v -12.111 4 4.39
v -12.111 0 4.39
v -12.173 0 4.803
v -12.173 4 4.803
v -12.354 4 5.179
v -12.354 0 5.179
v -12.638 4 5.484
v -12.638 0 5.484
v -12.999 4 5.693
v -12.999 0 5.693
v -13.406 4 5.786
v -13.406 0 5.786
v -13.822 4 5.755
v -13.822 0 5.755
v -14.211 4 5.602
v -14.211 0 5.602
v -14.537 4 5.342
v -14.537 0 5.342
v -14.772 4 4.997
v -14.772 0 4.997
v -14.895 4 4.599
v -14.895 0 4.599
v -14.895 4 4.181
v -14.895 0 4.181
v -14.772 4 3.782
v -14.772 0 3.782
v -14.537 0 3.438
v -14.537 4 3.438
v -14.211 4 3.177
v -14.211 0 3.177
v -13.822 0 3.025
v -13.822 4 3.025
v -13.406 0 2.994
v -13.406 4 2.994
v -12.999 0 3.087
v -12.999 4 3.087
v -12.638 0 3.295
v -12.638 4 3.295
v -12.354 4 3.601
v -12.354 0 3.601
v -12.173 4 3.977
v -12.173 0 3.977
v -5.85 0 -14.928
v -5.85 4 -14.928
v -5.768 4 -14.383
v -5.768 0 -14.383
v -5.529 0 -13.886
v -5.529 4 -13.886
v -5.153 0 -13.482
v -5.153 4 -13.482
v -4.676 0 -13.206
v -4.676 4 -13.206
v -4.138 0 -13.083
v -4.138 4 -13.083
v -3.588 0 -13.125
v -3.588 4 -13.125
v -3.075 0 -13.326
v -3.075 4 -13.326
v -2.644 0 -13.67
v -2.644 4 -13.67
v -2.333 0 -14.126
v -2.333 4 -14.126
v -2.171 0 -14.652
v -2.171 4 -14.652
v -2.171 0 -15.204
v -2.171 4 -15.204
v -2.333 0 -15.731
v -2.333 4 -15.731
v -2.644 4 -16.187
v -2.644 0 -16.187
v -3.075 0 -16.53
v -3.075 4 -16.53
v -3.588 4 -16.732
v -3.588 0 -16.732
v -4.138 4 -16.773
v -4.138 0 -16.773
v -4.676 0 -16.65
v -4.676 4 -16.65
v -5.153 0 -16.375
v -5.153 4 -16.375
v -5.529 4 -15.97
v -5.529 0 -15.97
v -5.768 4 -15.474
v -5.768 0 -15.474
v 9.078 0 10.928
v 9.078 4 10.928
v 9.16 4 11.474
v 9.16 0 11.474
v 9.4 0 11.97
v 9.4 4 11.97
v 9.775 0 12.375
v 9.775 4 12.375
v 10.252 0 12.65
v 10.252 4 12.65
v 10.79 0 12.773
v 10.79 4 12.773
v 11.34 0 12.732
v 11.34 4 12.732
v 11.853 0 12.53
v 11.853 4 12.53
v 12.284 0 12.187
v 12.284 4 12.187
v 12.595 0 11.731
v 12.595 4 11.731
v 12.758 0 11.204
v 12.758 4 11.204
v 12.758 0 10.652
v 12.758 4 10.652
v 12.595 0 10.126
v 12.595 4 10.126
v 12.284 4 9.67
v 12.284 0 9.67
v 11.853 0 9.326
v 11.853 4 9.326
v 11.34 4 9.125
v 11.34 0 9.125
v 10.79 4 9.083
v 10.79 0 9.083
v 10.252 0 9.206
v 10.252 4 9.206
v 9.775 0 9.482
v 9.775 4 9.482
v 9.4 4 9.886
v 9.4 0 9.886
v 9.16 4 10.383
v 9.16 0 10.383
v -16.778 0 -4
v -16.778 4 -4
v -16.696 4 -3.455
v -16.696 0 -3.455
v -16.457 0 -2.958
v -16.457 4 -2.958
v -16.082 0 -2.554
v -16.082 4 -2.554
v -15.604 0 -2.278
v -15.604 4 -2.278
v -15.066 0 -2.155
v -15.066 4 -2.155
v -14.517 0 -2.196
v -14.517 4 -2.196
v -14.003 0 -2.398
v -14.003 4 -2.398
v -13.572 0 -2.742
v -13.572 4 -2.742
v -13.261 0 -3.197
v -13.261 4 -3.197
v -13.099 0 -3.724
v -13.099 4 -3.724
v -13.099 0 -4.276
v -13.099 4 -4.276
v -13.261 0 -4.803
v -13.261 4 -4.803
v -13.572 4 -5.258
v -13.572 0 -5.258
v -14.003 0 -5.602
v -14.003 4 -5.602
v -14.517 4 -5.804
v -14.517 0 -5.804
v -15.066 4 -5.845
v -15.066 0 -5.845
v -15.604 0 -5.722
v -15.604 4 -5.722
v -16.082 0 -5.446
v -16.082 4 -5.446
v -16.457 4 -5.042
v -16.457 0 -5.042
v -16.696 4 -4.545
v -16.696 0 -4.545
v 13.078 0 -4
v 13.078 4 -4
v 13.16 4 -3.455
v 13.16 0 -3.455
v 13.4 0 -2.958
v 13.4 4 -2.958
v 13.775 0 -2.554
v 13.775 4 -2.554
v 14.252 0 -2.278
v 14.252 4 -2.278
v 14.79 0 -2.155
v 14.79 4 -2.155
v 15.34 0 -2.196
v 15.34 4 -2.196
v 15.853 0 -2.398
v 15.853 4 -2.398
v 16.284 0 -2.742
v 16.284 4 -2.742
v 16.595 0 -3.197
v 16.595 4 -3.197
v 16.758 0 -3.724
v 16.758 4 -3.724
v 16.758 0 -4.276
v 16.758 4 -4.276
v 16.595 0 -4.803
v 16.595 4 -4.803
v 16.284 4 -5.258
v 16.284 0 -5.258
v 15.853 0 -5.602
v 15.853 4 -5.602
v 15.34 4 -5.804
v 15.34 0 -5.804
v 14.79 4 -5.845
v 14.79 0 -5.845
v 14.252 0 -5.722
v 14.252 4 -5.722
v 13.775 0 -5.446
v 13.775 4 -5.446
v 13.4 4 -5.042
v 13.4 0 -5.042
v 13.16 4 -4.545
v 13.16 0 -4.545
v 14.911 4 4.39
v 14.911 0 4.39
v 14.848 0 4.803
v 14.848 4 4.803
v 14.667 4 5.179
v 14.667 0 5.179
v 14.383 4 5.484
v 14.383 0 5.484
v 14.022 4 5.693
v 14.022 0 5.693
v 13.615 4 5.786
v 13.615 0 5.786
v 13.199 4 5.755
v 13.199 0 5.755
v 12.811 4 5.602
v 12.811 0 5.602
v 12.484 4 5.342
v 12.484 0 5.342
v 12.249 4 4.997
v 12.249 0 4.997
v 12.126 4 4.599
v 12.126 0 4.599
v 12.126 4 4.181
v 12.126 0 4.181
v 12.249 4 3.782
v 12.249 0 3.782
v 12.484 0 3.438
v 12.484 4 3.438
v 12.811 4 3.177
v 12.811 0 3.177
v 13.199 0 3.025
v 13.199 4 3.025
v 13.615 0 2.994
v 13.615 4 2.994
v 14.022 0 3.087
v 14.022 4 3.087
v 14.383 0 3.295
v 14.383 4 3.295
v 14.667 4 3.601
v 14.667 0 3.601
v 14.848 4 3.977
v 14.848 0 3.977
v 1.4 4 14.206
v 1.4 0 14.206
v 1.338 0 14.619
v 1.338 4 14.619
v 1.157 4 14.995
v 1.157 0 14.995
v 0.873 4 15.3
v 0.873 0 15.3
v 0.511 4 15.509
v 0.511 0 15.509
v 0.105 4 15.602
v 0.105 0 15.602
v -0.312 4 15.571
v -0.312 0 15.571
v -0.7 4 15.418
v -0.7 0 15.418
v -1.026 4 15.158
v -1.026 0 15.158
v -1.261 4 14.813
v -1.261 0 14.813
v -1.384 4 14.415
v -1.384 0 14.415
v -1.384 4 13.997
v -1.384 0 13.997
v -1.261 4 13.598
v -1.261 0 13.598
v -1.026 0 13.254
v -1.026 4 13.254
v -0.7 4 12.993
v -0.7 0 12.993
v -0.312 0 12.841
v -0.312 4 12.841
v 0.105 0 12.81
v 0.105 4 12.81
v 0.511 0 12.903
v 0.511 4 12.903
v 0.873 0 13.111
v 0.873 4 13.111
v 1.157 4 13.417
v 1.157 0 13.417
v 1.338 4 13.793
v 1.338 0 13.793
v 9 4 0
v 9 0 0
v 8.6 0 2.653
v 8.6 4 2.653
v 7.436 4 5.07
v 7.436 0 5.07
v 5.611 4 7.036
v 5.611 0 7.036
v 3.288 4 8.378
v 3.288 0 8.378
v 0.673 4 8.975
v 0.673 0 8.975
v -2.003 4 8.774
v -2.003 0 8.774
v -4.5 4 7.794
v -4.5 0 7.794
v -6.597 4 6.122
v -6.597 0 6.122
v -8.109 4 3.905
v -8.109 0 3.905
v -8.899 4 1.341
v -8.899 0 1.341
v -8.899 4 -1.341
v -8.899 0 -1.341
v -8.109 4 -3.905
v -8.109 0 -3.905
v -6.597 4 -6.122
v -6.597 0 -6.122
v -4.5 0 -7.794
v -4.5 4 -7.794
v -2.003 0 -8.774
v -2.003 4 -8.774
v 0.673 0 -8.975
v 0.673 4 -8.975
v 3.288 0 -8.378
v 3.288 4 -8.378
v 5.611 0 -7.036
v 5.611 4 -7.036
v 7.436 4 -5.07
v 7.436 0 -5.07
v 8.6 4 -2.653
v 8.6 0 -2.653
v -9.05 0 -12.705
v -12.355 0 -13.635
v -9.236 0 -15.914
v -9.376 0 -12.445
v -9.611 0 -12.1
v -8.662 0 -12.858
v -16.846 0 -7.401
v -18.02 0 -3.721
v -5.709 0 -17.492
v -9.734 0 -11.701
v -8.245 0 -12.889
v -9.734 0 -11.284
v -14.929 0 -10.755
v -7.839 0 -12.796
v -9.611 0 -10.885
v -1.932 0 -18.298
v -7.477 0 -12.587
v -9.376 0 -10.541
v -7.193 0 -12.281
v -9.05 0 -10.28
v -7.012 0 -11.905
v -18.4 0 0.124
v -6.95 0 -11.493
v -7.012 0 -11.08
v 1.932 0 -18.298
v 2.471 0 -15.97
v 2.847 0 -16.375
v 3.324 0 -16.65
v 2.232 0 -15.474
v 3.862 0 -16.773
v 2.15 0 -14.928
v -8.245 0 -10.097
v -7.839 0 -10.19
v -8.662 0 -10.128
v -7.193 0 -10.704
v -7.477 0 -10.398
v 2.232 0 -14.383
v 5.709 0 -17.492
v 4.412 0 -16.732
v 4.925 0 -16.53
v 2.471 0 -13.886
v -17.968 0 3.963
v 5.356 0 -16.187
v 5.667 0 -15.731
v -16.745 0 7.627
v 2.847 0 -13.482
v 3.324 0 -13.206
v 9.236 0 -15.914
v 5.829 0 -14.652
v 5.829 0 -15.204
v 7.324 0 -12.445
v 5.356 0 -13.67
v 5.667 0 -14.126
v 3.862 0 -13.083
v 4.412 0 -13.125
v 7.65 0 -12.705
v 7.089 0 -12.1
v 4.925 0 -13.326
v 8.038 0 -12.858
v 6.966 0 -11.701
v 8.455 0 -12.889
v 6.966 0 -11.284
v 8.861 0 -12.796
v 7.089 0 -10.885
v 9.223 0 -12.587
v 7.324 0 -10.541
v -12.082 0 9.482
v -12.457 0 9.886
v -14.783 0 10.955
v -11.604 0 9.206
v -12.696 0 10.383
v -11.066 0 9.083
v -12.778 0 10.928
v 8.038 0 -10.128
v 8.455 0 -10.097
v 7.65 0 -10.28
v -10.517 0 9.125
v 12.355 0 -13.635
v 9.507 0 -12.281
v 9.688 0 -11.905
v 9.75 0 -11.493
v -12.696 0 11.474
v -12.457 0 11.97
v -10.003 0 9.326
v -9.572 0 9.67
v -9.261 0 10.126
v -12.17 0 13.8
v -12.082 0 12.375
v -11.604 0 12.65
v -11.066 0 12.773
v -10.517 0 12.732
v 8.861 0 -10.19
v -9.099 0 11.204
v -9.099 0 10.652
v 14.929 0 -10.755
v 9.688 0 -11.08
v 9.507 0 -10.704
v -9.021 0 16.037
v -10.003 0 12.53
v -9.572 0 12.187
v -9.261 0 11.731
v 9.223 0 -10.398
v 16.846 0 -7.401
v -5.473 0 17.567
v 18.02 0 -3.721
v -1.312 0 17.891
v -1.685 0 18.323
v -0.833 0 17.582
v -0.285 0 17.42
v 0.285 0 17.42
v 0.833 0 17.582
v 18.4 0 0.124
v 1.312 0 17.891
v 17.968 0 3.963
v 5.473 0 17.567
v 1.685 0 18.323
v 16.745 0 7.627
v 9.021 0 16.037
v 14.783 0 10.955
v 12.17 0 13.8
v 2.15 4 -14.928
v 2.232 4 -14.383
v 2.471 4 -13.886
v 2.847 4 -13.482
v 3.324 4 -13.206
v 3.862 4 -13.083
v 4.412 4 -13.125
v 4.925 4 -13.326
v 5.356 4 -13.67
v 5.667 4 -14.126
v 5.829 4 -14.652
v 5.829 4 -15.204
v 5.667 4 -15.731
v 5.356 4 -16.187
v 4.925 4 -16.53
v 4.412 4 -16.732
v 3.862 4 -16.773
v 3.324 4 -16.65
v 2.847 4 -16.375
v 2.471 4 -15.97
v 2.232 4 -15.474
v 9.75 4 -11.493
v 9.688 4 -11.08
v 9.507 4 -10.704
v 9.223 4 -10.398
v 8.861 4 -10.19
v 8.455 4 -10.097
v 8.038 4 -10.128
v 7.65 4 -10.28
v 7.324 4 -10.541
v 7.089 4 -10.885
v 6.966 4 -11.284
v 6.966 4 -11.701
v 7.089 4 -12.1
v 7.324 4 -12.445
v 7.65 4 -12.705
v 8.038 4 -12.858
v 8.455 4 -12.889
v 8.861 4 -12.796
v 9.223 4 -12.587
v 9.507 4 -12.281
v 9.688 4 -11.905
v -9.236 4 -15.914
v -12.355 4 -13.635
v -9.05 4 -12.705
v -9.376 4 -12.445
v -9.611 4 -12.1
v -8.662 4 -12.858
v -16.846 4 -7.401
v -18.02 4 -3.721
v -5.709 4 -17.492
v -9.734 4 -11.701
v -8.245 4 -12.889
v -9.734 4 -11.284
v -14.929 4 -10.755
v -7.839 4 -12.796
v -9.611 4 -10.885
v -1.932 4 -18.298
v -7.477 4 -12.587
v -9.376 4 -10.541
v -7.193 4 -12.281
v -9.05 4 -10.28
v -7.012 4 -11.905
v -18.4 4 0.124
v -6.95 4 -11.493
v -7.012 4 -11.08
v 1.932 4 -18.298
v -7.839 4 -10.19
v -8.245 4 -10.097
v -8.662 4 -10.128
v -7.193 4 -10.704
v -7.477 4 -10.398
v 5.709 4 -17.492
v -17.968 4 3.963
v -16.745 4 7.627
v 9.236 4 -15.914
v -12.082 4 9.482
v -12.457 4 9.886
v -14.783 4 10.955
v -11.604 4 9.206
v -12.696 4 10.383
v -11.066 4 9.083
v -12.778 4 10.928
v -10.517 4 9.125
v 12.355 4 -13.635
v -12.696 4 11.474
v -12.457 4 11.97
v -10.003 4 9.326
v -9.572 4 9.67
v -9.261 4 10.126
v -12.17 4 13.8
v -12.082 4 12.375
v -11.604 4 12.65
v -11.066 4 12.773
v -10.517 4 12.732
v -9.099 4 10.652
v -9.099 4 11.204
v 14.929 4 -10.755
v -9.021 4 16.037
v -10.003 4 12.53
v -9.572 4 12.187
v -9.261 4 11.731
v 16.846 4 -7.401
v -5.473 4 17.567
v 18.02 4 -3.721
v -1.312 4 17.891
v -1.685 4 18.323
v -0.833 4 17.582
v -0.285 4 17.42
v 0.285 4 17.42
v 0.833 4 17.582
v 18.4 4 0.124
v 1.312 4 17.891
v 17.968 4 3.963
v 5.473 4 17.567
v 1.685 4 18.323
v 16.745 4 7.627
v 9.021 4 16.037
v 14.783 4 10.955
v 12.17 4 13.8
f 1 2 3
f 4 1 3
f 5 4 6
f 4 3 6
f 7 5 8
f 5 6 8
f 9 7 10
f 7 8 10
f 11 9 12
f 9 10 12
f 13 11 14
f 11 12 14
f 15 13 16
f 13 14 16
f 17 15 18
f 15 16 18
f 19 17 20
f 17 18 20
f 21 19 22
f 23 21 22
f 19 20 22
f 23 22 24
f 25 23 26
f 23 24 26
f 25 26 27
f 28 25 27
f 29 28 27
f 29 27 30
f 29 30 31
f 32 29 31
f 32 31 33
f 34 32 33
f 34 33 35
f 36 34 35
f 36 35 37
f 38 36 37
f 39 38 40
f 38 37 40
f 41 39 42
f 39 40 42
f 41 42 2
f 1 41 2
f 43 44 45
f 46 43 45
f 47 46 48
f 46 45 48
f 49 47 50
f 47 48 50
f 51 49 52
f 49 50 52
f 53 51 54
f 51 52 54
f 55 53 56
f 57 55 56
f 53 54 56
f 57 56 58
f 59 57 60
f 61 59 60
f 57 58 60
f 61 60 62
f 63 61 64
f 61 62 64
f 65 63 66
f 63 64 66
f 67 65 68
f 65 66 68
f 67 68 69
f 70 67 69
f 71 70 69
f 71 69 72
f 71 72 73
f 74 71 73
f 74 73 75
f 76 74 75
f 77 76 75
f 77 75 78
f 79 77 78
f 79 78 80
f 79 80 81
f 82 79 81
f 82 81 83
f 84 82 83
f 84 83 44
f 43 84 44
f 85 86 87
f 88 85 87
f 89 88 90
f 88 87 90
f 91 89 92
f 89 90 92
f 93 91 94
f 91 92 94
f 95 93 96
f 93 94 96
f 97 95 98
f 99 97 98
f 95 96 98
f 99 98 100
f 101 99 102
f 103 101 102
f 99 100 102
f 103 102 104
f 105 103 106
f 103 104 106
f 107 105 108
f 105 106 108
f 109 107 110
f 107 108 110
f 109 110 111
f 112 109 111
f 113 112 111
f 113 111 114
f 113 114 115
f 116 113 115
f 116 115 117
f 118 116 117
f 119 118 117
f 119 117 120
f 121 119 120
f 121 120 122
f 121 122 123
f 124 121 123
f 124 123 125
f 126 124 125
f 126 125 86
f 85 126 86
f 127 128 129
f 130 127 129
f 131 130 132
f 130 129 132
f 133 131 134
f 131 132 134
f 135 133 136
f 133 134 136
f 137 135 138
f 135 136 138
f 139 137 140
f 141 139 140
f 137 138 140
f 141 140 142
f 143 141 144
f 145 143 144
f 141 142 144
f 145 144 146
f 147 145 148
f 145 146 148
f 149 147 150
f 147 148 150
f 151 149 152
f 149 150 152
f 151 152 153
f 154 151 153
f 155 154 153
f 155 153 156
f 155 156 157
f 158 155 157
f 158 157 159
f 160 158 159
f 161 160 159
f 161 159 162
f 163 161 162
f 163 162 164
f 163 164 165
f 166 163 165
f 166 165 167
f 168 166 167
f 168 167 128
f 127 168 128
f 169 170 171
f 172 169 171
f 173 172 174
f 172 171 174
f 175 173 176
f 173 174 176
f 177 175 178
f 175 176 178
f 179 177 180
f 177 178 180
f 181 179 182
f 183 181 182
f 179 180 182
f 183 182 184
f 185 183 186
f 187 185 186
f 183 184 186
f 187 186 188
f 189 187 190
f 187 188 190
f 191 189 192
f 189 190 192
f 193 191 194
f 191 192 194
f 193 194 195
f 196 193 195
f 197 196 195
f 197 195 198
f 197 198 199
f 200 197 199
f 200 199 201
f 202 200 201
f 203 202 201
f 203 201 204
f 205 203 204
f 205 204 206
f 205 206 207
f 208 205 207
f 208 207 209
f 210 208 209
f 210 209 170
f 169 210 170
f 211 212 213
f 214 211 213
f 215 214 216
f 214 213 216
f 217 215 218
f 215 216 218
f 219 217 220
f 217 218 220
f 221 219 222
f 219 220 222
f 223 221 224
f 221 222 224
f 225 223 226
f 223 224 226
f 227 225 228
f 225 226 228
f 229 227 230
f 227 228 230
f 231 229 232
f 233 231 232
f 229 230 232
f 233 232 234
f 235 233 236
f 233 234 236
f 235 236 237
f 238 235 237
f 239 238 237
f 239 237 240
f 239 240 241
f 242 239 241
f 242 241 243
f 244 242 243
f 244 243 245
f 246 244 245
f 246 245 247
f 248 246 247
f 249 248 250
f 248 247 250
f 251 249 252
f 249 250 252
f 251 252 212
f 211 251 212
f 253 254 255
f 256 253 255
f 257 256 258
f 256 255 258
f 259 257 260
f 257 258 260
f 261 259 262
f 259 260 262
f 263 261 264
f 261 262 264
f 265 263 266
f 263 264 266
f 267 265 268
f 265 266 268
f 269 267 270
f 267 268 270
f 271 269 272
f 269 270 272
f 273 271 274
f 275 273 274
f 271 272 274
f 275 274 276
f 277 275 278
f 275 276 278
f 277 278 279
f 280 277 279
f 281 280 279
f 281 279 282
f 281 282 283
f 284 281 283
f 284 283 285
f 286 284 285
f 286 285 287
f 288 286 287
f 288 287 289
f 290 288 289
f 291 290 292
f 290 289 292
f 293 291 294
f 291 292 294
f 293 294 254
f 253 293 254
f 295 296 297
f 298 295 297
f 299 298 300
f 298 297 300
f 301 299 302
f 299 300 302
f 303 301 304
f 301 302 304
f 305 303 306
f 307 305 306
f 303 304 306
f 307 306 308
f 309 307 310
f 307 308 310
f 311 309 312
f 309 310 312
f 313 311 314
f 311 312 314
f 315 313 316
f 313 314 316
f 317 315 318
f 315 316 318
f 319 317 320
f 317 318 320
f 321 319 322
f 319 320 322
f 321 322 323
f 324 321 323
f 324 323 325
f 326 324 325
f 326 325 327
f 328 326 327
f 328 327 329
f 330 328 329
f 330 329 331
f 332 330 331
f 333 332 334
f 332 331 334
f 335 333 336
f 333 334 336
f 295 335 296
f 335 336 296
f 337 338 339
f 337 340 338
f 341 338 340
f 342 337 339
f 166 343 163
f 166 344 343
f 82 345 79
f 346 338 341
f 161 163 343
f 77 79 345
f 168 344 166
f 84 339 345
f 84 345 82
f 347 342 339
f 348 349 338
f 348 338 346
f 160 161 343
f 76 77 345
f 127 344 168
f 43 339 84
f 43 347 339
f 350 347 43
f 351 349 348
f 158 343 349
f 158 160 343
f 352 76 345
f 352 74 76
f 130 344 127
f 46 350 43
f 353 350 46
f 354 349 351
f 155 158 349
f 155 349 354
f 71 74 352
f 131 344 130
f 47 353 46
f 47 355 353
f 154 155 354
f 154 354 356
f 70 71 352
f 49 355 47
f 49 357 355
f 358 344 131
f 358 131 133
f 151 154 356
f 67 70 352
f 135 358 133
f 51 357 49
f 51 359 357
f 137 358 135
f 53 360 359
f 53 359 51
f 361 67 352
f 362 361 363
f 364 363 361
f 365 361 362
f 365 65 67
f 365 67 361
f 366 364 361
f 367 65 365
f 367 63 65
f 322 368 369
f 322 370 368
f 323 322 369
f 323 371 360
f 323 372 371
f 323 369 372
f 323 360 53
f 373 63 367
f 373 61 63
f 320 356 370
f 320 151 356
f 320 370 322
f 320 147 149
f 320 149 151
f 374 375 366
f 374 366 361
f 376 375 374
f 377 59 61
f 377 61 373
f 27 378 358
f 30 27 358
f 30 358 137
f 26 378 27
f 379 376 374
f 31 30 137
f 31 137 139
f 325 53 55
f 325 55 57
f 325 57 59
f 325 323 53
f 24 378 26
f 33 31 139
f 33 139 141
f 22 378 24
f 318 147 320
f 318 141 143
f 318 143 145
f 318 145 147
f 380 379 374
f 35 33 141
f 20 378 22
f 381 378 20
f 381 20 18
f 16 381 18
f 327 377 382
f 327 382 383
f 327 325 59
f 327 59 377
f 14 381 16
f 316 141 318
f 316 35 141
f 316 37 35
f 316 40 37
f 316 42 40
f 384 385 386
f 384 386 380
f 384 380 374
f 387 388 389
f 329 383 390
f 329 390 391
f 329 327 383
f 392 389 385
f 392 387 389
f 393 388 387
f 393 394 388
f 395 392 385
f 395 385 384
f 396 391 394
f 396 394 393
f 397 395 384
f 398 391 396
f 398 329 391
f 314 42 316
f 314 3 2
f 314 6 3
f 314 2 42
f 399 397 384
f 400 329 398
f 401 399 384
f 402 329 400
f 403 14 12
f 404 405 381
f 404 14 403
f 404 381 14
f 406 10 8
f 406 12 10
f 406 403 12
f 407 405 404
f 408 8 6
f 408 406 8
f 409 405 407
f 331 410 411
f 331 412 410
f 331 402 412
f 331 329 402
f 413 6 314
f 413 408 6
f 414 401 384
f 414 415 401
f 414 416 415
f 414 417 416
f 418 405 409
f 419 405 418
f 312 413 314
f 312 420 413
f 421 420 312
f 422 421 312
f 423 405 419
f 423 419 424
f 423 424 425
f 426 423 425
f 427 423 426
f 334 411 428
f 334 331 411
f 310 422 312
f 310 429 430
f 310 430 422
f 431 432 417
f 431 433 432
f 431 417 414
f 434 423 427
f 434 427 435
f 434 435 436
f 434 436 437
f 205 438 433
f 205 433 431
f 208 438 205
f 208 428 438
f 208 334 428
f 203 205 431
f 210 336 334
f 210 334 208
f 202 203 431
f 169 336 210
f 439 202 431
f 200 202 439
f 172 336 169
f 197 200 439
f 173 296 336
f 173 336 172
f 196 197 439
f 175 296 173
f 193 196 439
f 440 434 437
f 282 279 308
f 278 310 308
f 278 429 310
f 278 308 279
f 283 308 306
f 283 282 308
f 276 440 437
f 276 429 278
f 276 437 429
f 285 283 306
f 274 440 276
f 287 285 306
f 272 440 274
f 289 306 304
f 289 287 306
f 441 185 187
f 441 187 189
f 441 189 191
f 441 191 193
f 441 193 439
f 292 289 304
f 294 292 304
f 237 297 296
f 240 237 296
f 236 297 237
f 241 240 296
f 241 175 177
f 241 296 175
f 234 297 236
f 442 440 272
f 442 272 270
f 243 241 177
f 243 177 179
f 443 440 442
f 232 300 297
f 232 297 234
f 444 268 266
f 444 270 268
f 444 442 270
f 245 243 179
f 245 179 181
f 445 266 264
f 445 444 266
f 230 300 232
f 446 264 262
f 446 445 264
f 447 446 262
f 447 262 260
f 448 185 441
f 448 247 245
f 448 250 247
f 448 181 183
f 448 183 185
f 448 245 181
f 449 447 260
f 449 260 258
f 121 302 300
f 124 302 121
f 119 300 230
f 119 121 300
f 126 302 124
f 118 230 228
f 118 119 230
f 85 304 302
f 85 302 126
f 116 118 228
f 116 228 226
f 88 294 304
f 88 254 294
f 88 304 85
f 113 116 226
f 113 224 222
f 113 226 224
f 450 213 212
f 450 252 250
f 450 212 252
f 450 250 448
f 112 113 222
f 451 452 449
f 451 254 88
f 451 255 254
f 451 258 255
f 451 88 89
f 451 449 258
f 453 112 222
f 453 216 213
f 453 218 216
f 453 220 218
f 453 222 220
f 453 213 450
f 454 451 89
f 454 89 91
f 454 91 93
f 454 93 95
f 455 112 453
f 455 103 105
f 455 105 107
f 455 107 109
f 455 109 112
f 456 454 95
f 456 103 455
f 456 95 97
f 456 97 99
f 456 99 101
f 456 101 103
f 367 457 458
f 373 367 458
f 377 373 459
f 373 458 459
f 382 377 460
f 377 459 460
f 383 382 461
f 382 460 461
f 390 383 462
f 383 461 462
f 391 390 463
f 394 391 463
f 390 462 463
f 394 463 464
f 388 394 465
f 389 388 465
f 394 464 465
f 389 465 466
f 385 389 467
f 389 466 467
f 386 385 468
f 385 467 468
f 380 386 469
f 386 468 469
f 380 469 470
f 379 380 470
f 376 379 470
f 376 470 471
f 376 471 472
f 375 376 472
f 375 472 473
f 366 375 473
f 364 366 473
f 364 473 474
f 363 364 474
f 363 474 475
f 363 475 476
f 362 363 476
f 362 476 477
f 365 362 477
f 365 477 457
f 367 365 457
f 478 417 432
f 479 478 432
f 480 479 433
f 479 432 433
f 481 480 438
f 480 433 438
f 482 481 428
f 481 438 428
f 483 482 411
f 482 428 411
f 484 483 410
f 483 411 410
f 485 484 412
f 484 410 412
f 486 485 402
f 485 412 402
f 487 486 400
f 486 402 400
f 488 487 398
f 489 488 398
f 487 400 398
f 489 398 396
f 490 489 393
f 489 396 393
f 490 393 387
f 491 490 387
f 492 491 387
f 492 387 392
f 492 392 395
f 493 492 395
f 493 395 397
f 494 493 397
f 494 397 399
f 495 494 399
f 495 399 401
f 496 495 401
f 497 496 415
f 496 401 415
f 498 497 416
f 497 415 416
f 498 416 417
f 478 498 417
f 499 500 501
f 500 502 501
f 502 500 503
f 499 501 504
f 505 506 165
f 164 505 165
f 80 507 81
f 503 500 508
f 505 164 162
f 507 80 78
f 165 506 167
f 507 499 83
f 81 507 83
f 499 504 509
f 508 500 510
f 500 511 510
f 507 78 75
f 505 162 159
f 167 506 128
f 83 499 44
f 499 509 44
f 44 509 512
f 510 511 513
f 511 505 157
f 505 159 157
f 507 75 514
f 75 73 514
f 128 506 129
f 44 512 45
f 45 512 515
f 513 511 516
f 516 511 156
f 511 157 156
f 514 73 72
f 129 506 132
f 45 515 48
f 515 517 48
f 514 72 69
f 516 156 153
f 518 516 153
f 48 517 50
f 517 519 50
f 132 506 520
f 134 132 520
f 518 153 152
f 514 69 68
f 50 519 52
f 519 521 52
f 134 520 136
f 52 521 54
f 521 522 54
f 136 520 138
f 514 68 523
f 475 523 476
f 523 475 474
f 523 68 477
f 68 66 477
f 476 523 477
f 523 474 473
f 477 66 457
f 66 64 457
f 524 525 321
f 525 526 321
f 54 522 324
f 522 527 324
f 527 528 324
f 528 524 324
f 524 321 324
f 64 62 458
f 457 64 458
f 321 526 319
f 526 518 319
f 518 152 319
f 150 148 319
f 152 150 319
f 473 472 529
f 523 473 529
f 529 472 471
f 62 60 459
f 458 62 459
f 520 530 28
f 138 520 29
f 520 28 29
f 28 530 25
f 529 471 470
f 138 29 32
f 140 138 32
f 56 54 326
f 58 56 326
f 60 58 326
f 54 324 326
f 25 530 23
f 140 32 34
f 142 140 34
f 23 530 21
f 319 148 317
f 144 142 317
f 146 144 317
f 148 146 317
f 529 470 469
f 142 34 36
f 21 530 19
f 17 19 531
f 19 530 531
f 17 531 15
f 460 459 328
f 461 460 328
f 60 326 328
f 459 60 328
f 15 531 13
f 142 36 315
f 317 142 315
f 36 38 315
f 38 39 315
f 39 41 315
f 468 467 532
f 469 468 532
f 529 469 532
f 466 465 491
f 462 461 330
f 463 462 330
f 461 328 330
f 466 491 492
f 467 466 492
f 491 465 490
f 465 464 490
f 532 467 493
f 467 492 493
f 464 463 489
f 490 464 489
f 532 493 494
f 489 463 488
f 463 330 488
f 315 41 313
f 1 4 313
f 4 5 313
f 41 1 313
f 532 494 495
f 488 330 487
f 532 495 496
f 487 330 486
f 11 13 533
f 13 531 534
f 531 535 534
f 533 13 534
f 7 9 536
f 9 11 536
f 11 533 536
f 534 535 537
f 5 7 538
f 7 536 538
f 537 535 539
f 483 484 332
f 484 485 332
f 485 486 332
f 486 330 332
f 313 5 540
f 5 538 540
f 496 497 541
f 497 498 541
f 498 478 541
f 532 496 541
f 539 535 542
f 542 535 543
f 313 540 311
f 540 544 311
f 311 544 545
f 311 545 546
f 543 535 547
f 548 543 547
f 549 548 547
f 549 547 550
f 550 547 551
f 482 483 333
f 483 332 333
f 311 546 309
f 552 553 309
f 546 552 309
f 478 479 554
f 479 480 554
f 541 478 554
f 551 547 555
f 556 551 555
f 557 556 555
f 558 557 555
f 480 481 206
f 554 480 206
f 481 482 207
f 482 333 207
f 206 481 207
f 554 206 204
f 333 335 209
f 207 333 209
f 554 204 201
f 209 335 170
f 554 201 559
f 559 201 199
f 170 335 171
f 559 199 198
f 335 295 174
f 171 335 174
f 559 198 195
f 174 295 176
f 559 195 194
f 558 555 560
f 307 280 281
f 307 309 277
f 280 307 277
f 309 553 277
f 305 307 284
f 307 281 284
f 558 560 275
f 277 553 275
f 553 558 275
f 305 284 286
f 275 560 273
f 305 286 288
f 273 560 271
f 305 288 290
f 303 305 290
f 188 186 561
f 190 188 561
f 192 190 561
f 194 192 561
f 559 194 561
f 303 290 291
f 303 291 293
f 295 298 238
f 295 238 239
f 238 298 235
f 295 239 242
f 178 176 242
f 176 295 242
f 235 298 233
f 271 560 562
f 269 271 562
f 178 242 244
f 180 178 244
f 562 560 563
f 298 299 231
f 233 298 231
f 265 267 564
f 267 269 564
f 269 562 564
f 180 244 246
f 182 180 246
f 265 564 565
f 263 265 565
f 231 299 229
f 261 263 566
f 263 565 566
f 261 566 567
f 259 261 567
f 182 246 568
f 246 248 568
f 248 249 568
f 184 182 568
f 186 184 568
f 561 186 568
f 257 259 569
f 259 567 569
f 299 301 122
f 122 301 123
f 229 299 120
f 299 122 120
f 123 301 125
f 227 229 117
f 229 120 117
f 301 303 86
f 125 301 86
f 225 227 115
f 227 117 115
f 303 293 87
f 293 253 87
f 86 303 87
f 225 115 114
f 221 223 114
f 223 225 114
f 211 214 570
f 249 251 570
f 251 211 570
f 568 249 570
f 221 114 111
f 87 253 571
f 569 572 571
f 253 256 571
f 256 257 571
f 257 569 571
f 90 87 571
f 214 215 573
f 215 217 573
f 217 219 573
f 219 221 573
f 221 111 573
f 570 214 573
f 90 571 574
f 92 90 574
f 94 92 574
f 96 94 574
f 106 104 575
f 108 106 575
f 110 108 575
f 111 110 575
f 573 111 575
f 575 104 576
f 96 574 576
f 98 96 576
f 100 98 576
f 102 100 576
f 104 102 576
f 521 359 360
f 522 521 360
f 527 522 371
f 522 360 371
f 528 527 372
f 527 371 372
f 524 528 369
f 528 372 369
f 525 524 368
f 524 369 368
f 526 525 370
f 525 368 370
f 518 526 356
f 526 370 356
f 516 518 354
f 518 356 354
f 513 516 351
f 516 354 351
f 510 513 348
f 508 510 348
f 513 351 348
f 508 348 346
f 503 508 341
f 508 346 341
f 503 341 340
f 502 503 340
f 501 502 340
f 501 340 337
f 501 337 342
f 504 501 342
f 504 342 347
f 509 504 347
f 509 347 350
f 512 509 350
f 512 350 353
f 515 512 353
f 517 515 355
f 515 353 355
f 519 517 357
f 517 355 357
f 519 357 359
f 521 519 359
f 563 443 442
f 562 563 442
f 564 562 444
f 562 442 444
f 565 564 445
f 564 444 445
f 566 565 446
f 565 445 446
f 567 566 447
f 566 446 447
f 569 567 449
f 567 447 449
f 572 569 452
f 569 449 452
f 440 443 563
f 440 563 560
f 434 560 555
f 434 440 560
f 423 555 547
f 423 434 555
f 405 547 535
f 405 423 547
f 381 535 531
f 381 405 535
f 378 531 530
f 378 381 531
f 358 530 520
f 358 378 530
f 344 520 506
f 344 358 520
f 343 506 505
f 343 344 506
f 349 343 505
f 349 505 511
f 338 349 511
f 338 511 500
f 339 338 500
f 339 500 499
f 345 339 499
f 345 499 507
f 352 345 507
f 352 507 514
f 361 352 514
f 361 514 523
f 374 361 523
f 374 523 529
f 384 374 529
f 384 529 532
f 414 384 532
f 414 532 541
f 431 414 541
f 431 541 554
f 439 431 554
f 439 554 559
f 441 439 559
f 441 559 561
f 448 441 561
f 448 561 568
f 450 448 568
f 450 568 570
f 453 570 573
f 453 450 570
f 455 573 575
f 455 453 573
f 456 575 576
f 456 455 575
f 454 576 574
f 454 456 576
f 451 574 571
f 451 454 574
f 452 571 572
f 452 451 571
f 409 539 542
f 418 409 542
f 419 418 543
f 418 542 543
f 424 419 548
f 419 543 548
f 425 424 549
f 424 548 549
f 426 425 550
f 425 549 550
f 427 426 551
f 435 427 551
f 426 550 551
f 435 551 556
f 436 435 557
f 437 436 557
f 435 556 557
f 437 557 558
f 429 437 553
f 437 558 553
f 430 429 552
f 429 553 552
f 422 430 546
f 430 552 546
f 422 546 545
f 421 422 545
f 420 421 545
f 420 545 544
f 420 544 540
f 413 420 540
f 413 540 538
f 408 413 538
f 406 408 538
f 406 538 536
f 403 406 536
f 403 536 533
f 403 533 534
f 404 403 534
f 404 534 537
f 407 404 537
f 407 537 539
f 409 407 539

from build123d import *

# Parameters (mm, degrees)
F0_R     = 18.4
F0_R_2   = 1.4
F0_R_3   = 9
F1_DEPTH = 4
F2_R     = 1.85
F3_DEPTH = 25
F5_DEPTH = 25


with BuildPart() as f1:
    # F0 (on Front) → F1 (new body)
    with BuildSketch(Plane.XZ):
        Circle(F0_R)
        with Locations((-8.35, -11.4927890359)):
            Circle(F0_R_2, mode=Mode.SUBTRACT)
        with Locations((8.35, -11.4927890359)):
            Circle(F0_R_2, mode=Mode.SUBTRACT)
        with Locations((-13.5105838061, 4.3898547862)):
            Circle(F0_R_2, mode=Mode.SUBTRACT)
        Circle(F0_R_3, mode=Mode.SUBTRACT)
        with Locations((13.5105838061, 4.3898547862)):
            Circle(F0_R_2, mode=Mode.SUBTRACT)
        with Locations((0, 14.2058684995)):
            Circle(F0_R_2, mode=Mode.SUBTRACT)
    extrude(amount=-F1_DEPTH)

    # F2 (on face) → F3 (cut)
    with BuildSketch(Plane(origin=(0, 4, 0), x_dir=(-1, 0, 0), z_dir=(0, 1, 0))):
        with Locations((-14.9282032303, -4)):
            Circle(F2_R)
        with Locations((-10.9282032303, 10.9282032303)):
            Circle(F2_R)
        with Locations((14.9282032303, -4)):
            Circle(F2_R)
        with Locations((10.9282032303, 10.9282032303)):
            Circle(F2_R)
        with Locations((4, -14.9282032303)):
            Circle(F2_R)
        with Locations((-4, -14.9282032303)):
            Circle(F2_R)
    extrude(amount=-F3_DEPTH, mode=Mode.SUBTRACT)

    # F4 (on face) → F5 (cut)
    with BuildSketch(Plane.XZ):
        with BuildLine():
            ThreePointArc((1.6850467371, 18.3226804124), (0, 18.4), (-1.6850467371, 18.3226804124))
            ThreePointArc((-1.6850467371, 18.3226804124), (0, 17.4), (1.6850467371, 18.3226804124))
        make_face()
    extrude(amount=-F5_DEPTH, mode=Mode.SUBTRACT)


solid = f1.part
